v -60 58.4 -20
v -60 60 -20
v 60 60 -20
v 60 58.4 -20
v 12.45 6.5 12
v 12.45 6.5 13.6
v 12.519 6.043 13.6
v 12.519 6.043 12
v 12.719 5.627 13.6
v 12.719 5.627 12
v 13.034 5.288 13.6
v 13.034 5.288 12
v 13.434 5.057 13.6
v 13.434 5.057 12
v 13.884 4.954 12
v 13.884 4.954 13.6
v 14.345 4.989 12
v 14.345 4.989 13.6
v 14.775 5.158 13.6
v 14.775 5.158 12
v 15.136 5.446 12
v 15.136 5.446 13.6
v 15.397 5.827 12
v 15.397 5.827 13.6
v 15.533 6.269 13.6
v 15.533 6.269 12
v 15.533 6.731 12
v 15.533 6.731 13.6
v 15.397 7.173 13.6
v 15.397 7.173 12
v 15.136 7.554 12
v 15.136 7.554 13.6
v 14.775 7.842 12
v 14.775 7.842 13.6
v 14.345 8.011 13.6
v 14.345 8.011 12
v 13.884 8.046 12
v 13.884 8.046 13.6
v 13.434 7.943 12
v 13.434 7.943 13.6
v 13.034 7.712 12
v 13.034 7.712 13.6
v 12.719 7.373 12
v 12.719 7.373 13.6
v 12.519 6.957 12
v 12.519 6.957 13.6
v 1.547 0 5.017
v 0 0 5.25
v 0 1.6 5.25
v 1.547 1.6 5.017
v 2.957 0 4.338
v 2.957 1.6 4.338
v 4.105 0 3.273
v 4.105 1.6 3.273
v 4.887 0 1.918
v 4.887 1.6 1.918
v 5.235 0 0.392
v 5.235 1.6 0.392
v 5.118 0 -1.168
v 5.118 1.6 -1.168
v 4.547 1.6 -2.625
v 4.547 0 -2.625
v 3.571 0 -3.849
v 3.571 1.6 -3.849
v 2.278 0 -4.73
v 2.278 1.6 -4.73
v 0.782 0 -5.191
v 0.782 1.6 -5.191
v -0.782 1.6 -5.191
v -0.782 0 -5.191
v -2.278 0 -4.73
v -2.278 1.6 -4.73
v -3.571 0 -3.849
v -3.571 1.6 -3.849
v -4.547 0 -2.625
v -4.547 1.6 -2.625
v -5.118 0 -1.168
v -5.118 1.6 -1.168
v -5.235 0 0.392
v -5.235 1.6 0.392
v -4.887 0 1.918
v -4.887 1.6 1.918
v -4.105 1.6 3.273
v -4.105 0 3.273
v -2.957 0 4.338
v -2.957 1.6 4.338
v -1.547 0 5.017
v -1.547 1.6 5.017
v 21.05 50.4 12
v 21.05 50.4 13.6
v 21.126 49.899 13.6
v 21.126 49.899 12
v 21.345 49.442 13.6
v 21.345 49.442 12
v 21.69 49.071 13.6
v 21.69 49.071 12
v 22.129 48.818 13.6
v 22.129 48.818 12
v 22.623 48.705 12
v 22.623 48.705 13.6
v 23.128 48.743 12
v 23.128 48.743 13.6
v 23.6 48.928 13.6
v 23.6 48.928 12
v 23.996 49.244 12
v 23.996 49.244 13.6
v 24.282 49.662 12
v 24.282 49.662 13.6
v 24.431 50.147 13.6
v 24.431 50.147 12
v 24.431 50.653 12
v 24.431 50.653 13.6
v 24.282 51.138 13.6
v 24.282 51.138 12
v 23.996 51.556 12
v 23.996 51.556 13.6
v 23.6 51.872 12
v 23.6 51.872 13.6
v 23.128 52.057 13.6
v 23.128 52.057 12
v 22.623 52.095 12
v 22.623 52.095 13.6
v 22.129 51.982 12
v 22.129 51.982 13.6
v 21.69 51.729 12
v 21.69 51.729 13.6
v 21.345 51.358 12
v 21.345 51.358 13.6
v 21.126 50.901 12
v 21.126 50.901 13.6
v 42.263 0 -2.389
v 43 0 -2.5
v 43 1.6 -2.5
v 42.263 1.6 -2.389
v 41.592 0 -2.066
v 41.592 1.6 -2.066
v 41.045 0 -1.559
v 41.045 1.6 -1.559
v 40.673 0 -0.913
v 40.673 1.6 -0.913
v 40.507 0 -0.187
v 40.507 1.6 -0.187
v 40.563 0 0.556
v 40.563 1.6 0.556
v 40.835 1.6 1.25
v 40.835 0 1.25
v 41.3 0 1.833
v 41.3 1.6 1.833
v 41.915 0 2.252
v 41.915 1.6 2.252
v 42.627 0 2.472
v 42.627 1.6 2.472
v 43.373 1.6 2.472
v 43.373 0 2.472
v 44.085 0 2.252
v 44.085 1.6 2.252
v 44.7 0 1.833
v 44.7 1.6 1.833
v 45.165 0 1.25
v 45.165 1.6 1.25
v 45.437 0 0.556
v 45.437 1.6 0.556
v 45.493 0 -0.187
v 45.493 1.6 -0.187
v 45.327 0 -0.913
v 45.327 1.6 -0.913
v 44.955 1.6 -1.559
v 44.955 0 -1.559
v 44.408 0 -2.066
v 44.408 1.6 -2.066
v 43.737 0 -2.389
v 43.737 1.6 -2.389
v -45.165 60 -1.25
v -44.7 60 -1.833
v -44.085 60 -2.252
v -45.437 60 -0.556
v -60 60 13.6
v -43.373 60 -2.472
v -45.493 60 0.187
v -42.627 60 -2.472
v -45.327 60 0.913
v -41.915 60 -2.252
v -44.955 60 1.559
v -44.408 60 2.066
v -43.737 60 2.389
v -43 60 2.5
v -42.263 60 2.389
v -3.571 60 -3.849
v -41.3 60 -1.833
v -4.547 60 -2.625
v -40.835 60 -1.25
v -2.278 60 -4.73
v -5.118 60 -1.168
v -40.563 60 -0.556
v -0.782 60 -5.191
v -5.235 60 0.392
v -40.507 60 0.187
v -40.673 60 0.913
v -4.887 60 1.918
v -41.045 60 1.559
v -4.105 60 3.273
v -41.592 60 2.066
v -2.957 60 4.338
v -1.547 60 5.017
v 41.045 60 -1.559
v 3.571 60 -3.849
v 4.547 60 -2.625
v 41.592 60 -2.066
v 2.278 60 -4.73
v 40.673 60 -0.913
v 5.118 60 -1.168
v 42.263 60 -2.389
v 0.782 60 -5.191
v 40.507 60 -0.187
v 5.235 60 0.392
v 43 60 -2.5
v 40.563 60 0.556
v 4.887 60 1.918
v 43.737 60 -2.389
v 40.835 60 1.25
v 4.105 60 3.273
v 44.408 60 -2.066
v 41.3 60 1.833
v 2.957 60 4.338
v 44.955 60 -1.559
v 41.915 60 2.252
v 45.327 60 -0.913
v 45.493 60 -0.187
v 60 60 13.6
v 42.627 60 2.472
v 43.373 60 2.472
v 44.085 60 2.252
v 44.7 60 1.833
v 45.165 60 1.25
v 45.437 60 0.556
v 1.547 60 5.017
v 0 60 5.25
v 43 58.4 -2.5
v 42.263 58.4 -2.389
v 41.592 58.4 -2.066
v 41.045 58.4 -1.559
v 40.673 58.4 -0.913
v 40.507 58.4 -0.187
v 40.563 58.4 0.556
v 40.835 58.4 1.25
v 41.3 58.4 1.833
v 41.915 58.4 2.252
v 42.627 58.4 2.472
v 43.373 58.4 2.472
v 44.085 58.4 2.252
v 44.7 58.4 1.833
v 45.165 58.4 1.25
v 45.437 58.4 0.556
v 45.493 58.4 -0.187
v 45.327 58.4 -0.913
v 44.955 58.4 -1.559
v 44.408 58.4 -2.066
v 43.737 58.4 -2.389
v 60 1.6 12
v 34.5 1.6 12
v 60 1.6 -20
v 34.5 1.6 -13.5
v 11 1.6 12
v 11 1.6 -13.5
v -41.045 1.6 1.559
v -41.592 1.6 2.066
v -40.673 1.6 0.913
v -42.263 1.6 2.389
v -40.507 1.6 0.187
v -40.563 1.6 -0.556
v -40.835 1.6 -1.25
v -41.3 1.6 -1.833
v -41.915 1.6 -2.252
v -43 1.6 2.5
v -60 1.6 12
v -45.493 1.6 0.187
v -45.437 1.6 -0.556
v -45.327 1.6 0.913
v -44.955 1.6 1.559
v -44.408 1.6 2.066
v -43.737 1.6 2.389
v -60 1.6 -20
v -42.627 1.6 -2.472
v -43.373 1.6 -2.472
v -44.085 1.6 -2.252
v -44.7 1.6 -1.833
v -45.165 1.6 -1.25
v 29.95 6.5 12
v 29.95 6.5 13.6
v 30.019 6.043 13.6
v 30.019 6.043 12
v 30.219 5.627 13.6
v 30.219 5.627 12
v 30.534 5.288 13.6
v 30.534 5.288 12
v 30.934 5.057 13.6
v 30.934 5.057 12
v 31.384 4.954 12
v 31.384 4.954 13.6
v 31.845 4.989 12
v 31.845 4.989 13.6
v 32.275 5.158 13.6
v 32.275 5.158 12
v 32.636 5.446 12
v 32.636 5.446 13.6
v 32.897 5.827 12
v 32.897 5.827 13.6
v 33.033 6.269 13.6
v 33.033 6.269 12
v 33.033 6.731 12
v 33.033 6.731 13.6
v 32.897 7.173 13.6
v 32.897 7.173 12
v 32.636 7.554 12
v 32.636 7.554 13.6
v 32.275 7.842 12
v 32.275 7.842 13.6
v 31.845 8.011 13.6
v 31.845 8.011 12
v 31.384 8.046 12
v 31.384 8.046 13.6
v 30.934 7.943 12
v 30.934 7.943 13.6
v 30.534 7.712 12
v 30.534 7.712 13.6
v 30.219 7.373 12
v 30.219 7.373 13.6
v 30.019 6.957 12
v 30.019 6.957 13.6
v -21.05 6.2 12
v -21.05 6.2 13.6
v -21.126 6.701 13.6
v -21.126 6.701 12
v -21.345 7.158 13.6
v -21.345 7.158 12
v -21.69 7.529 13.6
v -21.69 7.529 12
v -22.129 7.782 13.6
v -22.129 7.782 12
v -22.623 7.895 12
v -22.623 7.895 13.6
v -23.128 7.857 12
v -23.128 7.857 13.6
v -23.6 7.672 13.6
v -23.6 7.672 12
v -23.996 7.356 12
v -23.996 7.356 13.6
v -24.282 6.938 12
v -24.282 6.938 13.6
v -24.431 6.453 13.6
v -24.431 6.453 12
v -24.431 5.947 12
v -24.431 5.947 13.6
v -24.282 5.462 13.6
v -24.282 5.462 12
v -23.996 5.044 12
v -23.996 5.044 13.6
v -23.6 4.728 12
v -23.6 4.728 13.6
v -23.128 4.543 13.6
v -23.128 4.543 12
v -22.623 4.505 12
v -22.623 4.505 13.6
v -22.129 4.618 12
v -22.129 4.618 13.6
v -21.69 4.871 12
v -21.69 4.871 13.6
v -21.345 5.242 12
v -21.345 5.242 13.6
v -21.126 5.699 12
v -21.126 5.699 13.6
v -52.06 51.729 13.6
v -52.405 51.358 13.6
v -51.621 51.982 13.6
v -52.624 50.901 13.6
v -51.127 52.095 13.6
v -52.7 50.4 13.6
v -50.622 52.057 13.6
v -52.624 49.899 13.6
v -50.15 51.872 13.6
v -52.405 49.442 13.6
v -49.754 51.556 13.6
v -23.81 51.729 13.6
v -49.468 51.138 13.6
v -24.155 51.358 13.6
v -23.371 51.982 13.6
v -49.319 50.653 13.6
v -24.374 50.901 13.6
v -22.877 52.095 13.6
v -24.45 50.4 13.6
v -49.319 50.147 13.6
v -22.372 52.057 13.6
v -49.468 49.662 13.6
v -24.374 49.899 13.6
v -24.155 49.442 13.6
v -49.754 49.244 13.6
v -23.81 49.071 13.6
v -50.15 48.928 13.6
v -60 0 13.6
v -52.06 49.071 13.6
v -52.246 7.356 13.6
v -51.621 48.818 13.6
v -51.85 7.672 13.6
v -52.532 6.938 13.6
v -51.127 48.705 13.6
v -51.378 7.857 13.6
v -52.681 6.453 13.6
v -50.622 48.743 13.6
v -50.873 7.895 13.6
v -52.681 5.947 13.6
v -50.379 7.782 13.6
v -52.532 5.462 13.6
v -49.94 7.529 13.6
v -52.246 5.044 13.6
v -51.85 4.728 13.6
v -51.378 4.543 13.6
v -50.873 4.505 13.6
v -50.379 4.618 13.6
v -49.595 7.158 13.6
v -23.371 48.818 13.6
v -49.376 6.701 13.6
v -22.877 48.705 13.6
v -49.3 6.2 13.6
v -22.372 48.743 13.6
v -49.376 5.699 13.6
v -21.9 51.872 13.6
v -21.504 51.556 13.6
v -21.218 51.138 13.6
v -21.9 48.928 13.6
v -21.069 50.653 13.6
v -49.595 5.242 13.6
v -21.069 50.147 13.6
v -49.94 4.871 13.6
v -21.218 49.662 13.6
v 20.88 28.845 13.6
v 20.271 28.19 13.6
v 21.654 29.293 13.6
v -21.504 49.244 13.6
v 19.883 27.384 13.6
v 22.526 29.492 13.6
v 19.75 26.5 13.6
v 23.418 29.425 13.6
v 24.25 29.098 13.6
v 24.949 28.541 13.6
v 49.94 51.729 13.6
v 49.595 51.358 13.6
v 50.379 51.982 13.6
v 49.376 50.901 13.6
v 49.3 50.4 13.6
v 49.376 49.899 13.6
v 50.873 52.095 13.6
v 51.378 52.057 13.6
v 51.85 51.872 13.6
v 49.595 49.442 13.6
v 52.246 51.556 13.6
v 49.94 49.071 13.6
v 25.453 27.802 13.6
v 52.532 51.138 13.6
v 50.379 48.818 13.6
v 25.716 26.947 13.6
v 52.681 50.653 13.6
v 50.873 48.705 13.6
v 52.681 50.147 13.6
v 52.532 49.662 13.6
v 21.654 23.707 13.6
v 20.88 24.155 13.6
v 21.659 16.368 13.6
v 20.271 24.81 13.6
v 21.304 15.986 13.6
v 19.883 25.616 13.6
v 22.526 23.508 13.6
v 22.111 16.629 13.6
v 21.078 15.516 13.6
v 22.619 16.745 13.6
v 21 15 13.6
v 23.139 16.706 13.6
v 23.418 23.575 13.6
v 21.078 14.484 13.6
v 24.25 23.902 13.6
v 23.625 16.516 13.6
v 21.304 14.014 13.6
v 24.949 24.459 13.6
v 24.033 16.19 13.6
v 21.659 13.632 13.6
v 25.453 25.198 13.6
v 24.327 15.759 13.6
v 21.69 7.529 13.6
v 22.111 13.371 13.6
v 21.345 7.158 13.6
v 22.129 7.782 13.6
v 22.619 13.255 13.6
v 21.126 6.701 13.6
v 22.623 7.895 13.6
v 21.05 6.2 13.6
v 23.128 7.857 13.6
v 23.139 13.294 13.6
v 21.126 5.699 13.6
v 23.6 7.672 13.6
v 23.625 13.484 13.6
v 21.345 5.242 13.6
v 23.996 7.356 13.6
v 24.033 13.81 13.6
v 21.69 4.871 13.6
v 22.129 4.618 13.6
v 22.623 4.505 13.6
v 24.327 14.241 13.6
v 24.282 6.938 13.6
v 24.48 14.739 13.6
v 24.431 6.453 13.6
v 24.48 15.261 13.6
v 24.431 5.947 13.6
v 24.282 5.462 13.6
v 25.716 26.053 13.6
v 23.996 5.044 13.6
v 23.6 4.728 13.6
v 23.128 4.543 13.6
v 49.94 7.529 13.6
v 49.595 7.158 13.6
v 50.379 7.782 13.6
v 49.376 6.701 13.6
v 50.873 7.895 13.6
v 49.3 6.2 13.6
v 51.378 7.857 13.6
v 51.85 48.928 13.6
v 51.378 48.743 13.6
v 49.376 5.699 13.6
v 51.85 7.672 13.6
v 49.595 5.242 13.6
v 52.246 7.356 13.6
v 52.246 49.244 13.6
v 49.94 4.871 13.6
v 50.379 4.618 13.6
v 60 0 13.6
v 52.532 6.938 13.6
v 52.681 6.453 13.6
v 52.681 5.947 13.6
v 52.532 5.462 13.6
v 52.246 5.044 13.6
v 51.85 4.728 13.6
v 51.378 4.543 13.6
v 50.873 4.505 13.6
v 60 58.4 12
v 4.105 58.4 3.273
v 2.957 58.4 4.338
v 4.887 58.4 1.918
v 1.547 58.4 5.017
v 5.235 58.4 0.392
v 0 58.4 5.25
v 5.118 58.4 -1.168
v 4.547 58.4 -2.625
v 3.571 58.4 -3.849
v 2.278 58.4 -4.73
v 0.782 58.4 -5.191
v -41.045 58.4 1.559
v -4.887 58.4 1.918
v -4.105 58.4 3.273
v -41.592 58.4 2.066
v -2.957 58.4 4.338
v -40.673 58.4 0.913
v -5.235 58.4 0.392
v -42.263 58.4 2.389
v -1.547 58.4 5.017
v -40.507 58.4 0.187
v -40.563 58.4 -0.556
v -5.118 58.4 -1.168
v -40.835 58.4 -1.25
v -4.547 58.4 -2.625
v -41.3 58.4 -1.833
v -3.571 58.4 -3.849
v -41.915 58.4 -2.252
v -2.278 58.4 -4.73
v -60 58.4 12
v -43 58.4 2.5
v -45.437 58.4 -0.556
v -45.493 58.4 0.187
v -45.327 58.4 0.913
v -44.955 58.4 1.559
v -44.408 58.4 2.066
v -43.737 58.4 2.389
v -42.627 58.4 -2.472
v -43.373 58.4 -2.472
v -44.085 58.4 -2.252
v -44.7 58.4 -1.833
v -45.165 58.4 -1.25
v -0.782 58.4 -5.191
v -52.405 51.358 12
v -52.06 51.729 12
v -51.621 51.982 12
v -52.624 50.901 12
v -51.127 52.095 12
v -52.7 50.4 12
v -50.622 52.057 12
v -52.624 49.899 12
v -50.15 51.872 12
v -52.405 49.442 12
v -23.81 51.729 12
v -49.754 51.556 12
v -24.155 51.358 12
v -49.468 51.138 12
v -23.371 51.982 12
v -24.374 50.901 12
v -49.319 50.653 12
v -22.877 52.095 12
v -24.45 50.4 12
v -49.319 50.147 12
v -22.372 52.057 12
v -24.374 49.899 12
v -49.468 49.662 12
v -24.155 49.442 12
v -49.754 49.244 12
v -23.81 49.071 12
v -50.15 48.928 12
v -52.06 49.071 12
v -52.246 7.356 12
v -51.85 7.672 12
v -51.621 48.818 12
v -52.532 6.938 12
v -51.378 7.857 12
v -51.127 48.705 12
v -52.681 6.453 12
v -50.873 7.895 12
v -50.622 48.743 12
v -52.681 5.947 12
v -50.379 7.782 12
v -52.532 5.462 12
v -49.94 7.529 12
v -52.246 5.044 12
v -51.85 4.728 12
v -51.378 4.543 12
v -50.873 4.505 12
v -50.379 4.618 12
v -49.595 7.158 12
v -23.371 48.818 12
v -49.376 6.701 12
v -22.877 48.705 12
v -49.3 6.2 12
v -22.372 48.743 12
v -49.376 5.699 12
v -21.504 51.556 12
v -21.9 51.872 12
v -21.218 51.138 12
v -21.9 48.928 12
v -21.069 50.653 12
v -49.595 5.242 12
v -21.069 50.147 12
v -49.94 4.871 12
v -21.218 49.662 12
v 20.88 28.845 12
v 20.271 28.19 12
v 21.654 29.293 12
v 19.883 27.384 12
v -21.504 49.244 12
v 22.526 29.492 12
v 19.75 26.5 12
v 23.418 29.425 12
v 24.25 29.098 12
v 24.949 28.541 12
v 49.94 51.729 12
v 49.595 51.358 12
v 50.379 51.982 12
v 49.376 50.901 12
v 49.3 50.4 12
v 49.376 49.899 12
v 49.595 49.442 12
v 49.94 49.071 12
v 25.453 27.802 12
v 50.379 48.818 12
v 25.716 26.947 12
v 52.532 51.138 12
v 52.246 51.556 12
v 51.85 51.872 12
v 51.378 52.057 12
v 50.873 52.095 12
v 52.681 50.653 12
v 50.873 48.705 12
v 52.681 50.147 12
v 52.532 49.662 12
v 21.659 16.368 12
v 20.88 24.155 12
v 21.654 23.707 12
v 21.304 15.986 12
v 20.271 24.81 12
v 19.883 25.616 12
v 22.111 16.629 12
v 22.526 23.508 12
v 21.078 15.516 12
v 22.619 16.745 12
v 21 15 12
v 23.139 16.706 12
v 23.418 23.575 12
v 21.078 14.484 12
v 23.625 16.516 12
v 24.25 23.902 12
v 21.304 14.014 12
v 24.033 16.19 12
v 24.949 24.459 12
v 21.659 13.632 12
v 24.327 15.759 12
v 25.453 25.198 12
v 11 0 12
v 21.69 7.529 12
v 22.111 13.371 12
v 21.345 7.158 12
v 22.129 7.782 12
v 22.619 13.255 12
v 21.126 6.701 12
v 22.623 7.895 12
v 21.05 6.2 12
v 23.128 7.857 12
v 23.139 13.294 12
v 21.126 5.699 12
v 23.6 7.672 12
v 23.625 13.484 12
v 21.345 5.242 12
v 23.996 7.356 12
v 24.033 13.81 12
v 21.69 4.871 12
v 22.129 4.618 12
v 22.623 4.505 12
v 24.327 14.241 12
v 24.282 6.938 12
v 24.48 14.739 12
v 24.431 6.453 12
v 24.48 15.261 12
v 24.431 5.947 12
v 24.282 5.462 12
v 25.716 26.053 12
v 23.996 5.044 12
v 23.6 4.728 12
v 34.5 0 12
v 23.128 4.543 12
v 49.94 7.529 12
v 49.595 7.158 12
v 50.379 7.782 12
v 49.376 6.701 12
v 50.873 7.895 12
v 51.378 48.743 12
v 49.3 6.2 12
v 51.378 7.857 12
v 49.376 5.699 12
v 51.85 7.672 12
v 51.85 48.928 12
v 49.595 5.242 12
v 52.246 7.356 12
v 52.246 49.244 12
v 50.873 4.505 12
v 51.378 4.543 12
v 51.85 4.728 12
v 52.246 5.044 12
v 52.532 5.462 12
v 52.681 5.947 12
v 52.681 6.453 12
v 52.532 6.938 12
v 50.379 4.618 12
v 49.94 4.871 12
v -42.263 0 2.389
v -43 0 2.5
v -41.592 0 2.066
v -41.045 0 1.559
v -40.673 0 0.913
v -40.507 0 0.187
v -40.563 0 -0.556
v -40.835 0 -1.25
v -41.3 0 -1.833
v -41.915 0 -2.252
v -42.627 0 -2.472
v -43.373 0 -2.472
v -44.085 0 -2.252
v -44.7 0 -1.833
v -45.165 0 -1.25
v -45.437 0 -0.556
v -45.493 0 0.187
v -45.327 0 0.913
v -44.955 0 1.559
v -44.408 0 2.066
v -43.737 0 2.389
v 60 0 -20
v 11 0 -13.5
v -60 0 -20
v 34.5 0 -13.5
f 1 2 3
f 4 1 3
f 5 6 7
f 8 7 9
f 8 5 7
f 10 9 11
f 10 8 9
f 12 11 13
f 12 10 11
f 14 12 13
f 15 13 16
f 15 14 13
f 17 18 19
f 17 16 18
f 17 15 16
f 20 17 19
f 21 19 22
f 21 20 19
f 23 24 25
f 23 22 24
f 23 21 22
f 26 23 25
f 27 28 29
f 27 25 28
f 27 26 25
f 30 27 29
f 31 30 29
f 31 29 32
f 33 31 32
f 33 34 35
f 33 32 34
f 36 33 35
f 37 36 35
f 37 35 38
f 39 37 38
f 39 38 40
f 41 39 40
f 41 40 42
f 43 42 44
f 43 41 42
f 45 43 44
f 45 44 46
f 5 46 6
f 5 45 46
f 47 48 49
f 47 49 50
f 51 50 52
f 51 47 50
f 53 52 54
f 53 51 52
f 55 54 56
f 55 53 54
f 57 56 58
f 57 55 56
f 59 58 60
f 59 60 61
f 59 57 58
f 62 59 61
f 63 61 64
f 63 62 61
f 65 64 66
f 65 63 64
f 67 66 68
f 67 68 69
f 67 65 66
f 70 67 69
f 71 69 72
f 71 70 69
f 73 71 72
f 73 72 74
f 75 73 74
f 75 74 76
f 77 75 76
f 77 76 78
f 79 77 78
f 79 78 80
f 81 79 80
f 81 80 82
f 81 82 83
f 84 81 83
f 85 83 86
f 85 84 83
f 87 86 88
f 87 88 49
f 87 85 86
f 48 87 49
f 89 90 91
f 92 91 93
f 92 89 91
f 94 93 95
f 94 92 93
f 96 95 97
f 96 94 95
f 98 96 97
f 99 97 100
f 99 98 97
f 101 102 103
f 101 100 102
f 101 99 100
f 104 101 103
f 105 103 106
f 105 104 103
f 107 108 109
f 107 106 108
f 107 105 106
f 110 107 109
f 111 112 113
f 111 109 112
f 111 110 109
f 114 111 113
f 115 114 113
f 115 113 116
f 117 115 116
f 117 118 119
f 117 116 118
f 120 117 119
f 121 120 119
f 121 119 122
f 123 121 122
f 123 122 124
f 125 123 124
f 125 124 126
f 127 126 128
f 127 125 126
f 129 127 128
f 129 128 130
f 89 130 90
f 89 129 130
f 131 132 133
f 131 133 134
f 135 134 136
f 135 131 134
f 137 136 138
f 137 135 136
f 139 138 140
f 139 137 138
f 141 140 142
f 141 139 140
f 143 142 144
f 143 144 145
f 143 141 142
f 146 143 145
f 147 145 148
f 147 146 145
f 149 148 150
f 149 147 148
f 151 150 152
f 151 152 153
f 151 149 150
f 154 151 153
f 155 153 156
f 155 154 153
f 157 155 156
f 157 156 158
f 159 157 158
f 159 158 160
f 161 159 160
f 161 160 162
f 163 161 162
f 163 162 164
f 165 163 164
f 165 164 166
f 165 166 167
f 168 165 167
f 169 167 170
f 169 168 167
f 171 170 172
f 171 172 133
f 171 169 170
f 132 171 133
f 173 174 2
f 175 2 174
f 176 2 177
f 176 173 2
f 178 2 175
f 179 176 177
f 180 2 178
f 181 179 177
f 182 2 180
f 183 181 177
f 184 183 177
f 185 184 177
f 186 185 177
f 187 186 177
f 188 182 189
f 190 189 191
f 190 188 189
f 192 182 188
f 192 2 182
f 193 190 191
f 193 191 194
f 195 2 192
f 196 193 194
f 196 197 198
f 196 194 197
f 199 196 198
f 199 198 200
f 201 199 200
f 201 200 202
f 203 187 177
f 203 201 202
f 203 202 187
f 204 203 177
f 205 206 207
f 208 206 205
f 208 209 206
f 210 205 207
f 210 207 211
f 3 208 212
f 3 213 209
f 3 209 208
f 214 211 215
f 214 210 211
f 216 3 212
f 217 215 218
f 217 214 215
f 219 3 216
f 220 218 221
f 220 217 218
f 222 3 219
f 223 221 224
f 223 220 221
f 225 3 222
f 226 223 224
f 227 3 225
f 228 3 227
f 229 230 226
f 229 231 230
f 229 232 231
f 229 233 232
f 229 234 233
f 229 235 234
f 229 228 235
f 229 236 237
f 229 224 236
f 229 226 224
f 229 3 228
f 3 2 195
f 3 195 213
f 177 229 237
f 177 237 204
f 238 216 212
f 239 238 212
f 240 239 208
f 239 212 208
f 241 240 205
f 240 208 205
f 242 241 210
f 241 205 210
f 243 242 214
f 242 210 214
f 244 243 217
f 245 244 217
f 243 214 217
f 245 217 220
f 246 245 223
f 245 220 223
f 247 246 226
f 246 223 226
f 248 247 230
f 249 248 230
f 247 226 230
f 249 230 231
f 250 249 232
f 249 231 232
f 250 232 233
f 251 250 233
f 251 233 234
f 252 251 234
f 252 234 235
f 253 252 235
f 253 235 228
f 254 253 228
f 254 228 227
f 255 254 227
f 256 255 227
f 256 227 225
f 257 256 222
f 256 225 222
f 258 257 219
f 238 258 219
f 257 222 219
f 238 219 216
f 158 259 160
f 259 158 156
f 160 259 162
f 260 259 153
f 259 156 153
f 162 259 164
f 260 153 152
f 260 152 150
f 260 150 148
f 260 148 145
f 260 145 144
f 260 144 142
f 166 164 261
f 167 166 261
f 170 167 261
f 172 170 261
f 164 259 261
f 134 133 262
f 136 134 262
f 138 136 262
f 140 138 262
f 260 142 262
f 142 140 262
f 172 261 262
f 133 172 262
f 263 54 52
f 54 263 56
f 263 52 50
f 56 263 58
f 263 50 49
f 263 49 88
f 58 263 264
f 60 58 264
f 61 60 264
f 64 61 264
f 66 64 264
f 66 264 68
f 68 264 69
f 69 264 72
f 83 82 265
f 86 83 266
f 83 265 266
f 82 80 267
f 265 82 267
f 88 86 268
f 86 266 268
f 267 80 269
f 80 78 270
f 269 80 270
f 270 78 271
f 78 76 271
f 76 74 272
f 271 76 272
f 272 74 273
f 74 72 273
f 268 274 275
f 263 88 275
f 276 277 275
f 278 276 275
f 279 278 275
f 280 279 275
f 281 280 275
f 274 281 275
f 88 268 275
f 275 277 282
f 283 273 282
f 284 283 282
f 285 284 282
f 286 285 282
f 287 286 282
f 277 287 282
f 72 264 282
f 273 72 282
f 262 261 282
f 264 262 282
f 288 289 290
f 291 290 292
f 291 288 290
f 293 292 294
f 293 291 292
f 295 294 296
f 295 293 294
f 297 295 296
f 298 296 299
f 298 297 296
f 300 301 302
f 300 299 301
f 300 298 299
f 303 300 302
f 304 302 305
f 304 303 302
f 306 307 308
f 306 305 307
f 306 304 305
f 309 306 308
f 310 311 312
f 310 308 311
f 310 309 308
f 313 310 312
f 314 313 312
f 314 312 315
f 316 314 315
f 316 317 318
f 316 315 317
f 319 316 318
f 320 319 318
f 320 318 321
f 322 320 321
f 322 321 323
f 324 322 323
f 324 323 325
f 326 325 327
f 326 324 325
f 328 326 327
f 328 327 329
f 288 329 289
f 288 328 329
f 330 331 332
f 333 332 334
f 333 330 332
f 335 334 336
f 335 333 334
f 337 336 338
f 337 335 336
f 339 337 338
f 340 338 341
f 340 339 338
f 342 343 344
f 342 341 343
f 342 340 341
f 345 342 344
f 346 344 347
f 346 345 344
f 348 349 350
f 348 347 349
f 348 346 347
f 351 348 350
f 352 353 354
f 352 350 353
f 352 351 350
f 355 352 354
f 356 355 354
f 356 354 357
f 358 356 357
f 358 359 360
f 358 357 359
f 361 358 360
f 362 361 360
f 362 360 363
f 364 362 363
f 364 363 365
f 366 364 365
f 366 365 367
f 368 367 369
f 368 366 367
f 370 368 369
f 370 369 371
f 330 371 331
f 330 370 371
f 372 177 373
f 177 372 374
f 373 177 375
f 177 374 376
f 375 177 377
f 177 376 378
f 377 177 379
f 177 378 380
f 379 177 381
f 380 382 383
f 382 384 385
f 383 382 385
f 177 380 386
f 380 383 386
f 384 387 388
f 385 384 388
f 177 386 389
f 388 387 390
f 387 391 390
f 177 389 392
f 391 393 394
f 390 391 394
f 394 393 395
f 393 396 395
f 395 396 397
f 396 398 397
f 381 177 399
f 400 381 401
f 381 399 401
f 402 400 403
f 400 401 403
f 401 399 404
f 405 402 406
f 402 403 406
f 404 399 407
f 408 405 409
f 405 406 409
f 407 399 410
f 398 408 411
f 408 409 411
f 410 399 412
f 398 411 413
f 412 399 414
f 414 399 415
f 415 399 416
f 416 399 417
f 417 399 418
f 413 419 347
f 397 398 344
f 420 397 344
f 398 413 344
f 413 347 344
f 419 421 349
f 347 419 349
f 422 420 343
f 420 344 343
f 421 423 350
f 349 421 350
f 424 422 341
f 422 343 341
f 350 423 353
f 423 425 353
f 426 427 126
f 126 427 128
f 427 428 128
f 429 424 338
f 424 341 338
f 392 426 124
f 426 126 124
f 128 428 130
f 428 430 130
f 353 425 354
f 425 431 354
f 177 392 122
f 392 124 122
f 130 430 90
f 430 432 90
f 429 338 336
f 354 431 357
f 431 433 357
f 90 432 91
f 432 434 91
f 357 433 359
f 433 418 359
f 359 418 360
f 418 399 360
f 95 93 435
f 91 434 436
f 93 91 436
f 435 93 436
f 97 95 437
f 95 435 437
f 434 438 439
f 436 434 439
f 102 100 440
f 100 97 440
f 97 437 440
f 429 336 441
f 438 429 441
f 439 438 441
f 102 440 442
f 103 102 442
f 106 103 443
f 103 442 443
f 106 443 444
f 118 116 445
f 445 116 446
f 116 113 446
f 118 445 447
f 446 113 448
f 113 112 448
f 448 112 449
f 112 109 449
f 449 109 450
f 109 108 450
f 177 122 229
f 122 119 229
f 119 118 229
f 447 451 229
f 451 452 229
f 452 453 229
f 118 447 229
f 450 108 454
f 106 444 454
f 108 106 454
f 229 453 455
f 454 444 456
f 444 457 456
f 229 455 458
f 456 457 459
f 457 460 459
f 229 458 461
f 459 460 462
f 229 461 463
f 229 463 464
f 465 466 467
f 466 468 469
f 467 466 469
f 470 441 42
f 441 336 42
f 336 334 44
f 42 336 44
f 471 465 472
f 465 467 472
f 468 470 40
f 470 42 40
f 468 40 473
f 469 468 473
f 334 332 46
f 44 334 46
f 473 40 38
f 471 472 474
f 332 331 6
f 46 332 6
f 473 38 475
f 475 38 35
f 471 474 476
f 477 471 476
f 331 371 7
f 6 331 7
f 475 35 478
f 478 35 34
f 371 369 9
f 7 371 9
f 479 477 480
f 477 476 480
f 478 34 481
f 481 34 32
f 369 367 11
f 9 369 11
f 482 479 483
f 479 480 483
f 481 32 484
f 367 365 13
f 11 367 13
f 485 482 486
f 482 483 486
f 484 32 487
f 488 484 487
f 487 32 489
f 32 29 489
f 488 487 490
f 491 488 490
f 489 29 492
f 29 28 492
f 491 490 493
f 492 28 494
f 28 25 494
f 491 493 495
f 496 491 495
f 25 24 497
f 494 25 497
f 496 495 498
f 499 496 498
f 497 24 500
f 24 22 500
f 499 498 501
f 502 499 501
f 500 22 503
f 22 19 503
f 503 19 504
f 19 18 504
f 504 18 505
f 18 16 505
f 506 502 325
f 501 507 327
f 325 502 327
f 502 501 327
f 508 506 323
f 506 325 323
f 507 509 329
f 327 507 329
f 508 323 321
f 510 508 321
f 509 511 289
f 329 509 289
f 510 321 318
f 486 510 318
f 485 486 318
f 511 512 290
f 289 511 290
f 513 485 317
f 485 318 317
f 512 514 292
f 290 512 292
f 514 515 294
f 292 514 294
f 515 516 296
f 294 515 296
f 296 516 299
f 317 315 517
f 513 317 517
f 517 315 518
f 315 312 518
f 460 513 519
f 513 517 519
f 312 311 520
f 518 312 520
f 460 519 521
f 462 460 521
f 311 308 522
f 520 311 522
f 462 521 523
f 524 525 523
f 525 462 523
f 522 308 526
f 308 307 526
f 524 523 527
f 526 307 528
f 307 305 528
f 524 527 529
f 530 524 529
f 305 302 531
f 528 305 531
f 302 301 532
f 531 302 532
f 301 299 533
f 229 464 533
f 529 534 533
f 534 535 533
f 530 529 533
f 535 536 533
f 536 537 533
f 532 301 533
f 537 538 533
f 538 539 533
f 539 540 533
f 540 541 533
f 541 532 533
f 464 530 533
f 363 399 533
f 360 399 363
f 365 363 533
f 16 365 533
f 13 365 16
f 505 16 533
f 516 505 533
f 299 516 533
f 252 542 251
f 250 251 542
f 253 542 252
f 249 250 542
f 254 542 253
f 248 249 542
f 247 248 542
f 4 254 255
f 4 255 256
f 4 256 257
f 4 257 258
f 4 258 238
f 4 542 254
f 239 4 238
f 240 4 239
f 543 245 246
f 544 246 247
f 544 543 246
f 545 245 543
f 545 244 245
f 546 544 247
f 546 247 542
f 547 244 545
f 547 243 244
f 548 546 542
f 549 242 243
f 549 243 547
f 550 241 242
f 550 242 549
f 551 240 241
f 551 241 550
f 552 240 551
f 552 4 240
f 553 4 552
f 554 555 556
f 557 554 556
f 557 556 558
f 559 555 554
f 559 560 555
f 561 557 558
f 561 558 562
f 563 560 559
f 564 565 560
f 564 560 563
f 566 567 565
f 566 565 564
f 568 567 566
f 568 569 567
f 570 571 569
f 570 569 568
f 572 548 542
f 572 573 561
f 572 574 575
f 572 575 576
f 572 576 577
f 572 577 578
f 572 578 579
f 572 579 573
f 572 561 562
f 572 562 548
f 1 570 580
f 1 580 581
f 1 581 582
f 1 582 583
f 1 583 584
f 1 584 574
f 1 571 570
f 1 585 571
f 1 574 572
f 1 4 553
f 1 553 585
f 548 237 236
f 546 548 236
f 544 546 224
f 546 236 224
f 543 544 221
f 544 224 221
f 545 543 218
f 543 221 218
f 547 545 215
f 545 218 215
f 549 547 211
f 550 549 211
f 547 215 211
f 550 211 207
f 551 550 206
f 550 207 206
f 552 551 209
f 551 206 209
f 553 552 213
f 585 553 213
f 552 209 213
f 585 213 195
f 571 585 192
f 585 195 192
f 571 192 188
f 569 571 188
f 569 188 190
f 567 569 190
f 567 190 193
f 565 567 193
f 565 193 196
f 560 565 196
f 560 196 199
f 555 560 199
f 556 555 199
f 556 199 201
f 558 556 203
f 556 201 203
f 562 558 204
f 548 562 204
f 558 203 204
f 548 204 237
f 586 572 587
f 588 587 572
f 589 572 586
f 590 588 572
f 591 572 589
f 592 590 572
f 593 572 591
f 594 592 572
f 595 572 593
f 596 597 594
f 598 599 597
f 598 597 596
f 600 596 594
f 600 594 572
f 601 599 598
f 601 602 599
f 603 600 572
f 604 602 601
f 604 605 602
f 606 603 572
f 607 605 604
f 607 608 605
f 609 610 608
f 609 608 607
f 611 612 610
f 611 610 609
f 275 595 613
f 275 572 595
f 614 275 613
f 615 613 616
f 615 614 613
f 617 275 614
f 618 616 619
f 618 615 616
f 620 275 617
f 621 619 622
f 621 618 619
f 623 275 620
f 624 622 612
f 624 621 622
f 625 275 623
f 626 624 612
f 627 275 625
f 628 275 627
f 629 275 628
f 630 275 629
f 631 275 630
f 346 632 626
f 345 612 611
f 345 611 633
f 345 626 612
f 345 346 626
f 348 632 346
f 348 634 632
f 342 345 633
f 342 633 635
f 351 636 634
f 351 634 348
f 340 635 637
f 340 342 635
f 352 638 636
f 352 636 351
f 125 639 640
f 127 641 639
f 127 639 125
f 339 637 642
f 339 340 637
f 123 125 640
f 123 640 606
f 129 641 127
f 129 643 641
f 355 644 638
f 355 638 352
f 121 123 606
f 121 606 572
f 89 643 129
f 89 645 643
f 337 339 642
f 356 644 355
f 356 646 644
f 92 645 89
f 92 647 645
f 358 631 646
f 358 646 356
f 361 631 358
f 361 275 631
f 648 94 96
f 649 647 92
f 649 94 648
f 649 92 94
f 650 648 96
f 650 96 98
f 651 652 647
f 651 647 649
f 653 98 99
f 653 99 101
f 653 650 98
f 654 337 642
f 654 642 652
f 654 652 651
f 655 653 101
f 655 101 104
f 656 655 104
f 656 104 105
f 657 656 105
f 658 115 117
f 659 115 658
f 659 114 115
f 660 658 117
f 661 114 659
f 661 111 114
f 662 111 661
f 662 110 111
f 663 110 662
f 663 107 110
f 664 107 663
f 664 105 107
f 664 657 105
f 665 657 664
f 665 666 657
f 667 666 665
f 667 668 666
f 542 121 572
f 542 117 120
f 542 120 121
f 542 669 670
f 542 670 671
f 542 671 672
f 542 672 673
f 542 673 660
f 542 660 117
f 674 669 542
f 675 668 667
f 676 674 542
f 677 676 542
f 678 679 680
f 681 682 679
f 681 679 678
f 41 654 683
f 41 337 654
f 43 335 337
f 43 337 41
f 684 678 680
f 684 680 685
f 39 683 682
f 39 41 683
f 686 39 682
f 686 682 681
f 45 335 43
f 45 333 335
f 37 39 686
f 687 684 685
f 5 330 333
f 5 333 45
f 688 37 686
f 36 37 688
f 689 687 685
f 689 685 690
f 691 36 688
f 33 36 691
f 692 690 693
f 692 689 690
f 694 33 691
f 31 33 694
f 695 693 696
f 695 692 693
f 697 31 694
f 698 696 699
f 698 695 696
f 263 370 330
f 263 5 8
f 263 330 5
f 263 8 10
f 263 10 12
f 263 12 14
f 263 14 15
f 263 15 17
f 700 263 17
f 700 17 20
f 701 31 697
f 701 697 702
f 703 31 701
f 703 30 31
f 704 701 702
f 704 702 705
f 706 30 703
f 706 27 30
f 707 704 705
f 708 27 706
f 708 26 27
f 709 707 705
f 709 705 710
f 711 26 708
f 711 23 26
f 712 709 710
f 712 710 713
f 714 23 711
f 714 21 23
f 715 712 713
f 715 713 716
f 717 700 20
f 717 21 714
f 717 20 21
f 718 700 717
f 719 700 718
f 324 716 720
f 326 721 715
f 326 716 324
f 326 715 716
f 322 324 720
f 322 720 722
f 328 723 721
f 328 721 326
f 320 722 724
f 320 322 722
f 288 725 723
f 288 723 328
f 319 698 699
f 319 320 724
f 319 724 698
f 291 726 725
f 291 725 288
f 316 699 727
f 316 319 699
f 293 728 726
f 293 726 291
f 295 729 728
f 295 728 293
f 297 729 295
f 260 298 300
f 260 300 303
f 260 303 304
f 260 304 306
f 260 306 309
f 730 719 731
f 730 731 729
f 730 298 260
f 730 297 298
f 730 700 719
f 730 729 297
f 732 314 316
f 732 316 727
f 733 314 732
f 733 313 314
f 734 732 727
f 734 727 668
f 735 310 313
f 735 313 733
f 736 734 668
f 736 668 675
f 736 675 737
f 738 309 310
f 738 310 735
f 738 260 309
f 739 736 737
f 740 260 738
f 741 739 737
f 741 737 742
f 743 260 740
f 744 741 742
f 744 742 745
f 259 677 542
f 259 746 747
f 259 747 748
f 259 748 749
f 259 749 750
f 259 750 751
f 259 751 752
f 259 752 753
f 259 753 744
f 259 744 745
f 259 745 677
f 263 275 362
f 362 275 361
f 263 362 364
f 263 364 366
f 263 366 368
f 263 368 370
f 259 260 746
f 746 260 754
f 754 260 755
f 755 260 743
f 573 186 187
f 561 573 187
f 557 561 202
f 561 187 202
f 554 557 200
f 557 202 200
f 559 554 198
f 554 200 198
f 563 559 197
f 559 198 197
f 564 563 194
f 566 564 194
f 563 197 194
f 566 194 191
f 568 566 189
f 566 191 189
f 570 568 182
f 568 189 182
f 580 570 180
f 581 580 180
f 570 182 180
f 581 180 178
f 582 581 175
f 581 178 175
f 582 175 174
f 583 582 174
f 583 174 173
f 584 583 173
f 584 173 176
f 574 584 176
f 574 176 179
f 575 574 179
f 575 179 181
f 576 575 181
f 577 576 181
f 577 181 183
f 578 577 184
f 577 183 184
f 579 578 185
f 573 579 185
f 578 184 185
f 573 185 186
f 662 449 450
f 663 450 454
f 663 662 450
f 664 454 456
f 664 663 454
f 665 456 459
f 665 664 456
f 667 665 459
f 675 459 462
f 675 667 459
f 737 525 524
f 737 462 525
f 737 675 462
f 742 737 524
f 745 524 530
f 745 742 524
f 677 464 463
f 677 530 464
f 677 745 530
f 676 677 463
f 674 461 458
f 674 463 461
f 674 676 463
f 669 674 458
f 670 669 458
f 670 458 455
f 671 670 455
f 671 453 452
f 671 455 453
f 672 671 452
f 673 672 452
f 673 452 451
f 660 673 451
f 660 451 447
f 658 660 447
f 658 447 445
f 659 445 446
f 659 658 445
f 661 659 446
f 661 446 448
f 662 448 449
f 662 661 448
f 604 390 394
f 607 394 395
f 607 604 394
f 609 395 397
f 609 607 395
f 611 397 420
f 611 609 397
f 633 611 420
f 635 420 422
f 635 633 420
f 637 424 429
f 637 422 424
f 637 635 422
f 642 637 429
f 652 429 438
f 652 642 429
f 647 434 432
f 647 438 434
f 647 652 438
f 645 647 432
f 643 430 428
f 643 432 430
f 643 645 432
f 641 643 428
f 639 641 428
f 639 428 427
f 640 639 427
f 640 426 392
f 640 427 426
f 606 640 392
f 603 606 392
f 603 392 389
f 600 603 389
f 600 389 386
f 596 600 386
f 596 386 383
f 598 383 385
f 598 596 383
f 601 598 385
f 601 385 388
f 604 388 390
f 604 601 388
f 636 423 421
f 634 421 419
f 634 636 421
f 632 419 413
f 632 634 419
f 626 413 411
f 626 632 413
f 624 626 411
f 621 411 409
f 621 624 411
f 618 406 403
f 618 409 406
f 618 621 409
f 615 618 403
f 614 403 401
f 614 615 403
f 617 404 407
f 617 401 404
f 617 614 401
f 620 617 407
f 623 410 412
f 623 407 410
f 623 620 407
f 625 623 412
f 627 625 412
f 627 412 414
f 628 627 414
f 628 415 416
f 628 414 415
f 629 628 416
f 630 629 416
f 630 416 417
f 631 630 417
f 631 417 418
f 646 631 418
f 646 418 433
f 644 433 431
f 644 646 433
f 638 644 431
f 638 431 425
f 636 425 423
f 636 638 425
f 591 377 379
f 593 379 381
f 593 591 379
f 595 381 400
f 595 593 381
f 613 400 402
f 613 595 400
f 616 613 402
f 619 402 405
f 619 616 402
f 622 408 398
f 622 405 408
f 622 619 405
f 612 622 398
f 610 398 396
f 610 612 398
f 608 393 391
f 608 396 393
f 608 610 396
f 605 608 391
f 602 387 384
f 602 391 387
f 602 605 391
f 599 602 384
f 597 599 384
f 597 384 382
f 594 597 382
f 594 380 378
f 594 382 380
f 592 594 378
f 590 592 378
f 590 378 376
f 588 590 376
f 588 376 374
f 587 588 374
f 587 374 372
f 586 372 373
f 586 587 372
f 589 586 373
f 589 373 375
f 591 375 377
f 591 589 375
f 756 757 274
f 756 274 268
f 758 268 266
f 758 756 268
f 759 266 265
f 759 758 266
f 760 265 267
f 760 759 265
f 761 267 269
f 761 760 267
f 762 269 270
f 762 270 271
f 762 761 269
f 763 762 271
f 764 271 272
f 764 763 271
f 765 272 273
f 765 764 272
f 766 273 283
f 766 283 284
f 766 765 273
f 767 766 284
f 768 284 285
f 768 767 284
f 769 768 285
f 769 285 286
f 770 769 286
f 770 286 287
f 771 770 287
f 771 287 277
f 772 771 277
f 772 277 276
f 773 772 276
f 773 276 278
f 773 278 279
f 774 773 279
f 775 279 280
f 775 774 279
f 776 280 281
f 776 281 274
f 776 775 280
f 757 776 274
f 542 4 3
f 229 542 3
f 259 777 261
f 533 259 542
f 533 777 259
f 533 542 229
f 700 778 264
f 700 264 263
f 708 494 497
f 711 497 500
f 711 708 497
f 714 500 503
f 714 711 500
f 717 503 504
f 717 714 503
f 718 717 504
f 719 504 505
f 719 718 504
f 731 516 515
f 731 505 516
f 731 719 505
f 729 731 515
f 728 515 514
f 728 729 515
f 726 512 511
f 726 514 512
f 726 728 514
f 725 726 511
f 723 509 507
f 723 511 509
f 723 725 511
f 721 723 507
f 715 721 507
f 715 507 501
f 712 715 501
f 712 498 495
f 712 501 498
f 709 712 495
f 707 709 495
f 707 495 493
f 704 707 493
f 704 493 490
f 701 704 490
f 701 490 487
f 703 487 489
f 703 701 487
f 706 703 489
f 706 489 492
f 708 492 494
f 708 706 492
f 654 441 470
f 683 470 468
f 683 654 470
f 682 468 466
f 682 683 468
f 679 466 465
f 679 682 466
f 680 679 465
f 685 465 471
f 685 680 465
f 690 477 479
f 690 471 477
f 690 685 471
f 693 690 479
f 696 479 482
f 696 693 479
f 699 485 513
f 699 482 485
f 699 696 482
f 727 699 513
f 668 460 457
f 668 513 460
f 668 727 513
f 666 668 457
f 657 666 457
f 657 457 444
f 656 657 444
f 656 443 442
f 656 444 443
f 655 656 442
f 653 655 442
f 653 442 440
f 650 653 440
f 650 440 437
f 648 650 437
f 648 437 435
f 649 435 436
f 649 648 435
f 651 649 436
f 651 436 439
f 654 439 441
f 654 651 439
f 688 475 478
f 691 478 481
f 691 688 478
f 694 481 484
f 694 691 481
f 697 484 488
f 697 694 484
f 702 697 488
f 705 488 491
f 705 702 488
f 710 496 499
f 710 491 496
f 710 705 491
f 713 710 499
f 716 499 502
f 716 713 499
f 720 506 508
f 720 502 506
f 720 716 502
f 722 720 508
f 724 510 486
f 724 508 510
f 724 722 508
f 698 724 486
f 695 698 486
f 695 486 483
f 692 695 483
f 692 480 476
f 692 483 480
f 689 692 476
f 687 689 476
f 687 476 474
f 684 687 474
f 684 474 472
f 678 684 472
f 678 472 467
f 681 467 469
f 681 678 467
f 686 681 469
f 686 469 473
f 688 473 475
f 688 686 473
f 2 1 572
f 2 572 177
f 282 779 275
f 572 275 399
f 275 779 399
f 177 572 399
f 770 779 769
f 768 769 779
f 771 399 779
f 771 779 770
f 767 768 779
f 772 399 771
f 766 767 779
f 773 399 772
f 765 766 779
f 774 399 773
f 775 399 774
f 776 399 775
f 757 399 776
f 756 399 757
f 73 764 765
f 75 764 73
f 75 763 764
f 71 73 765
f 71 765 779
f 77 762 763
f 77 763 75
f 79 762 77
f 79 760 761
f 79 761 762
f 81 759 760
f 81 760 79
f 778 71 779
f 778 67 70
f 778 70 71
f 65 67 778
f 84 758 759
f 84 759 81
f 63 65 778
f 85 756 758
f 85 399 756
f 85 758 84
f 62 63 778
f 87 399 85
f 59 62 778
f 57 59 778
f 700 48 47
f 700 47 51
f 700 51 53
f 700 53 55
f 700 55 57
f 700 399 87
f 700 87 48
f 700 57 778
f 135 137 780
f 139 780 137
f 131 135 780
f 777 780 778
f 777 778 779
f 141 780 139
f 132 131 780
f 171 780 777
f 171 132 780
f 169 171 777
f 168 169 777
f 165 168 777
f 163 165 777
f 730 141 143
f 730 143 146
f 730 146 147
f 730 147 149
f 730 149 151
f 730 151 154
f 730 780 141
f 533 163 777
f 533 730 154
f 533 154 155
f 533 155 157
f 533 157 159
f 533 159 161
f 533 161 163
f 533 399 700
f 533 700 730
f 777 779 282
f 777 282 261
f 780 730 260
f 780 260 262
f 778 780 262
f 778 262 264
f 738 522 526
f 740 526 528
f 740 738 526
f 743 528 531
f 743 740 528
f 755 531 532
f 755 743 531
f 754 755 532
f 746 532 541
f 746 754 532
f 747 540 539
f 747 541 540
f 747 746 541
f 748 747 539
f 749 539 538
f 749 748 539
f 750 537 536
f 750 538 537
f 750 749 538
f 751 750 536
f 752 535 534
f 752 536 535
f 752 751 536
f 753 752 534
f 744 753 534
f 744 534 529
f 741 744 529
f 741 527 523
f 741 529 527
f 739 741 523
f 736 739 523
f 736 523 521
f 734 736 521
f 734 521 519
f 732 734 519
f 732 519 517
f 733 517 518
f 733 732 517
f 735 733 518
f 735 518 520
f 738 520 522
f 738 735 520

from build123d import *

# Parameters (mm, degrees)
SKETCH1_R           = 5.25
SKETCH1_R_2         = 2.5
BOSS_EXTRUDE1_DEPTH = 1.6
SKETCH3_W           = 120
SKETCH3_H           = 1.6
BOSS_EXTRUDE3_DEPTH = 60
SKETCH4_R           = 3
SKETCH4_R_2         = 1.55
SKETCH4_R_3         = 1.75
CUT_EXTRUDE1_DEPTH  = 10
SKETCH6_R           = 1.7
CUT_EXTRUDE2_DEPTH  = 25
SKETCH7_W           = 25.5
SKETCH7_H           = 1.6
BOSS_EXTRUDE4_DEPTH = 25


with BuildPart() as part:
    # Sketch1 → Boss-Extrude1 (new body)
    with BuildSketch(Plane(origin=(0, 0, 0), x_dir=(1, 0, 0), z_dir=(0, 1, 0))):
        Polygon((34.5, -12), (34.5, 13.5), (11, 13.5), (11, -12), (-60, -12), (-60, 20), (60, 20), (60, -12), align=None)
        with Locations(Location((0, 0, 0), (0, 0, 270))):
            Circle(SKETCH1_R, mode=Mode.SUBTRACT)
        with Locations(Location((-43, 0, 0), (0, 0, 270))):
            Circle(SKETCH1_R_2, mode=Mode.SUBTRACT)
        with Locations(Location((43, 0, 0), (0, 0, 90))):
            Circle(SKETCH1_R_2, mode=Mode.SUBTRACT)
    boss_extrude1 = extrude(amount=BOSS_EXTRUDE1_DEPTH)

    # Sketch3 → Boss-Extrude3 (add)
    with BuildSketch(Plane.XZ):
        with Locations((0, 12.8)):
            Rectangle(SKETCH3_W, SKETCH3_H)
    extrude(amount=-BOSS_EXTRUDE3_DEPTH)

    # Mirror1: Boss-Extrude1 across plane
    add(boss_extrude1.mirror(Plane.ZX.offset(30)))

    # Sketch4 → Cut-Extrude1 (cut)
    with BuildSketch(Plane.XY.offset(12)):
        with Locations(Location((22.75, 26.5, 0), (0, 0, 180))):
            Circle(SKETCH4_R)
        with Locations(Location((31.5, 6.5, 0), (0, 0, 180))):
            Circle(SKETCH4_R_2)
        with Locations(Location((14, 6.5, 0), (0, 0, 180))):
            Circle(SKETCH4_R_2)
        with Locations(Location((22.75, 15, 0), (0, 0, 180))):
            Circle(SKETCH4_R_3)
    extrude(amount=CUT_EXTRUDE1_DEPTH, mode=Mode.SUBTRACT)

    # Sketch6 → Cut-Extrude2 (cut)
    with BuildSketch(Plane(origin=(124.244525073, 40.7, 12), x_dir=(1, 0, 0), z_dir=(0, 0, 1))):
        with Locations(Location((-175.244525073, 9.7, 0), (0, 0, 180))):
            Circle(SKETCH6_R)
        with Locations(Location((-146.994525073, 9.7, 0), (0, 0, 180))):
            Circle(SKETCH6_R)
        with Locations(Location((-101.494525073, 9.7, 0), (0, 0, 180))):
            Circle(SKETCH6_R)
        with Locations(Location((-73.244525073, 9.7, 0), (0, 0, 180))):
            Circle(SKETCH6_R)
        with Locations((-175.244525073, -34.5)):
            Circle(SKETCH6_R)
        with Locations((-146.994525073, -34.5)):
            Circle(SKETCH6_R)
        with Locations(Location((-101.494525073, -34.5, 0), (0, 0, 180))):
            Circle(SKETCH6_R)
        with Locations(Location((-73.244525073, -34.5, 0), (0, 0, 180))):
            Circle(SKETCH6_R)
    extrude(amount=CUT_EXTRUDE2_DEPTH, mode=Mode.SUBTRACT)

    # Sketch7 → Boss-Extrude4 (add)
    with BuildSketch(Plane.ZY.offset(-34.5)):
        with Locations((-0.75, 59.2)):
            Rectangle(SKETCH7_W, SKETCH7_H)
    extrude(amount=BOSS_EXTRUDE4_DEPTH)


solid = part.part
